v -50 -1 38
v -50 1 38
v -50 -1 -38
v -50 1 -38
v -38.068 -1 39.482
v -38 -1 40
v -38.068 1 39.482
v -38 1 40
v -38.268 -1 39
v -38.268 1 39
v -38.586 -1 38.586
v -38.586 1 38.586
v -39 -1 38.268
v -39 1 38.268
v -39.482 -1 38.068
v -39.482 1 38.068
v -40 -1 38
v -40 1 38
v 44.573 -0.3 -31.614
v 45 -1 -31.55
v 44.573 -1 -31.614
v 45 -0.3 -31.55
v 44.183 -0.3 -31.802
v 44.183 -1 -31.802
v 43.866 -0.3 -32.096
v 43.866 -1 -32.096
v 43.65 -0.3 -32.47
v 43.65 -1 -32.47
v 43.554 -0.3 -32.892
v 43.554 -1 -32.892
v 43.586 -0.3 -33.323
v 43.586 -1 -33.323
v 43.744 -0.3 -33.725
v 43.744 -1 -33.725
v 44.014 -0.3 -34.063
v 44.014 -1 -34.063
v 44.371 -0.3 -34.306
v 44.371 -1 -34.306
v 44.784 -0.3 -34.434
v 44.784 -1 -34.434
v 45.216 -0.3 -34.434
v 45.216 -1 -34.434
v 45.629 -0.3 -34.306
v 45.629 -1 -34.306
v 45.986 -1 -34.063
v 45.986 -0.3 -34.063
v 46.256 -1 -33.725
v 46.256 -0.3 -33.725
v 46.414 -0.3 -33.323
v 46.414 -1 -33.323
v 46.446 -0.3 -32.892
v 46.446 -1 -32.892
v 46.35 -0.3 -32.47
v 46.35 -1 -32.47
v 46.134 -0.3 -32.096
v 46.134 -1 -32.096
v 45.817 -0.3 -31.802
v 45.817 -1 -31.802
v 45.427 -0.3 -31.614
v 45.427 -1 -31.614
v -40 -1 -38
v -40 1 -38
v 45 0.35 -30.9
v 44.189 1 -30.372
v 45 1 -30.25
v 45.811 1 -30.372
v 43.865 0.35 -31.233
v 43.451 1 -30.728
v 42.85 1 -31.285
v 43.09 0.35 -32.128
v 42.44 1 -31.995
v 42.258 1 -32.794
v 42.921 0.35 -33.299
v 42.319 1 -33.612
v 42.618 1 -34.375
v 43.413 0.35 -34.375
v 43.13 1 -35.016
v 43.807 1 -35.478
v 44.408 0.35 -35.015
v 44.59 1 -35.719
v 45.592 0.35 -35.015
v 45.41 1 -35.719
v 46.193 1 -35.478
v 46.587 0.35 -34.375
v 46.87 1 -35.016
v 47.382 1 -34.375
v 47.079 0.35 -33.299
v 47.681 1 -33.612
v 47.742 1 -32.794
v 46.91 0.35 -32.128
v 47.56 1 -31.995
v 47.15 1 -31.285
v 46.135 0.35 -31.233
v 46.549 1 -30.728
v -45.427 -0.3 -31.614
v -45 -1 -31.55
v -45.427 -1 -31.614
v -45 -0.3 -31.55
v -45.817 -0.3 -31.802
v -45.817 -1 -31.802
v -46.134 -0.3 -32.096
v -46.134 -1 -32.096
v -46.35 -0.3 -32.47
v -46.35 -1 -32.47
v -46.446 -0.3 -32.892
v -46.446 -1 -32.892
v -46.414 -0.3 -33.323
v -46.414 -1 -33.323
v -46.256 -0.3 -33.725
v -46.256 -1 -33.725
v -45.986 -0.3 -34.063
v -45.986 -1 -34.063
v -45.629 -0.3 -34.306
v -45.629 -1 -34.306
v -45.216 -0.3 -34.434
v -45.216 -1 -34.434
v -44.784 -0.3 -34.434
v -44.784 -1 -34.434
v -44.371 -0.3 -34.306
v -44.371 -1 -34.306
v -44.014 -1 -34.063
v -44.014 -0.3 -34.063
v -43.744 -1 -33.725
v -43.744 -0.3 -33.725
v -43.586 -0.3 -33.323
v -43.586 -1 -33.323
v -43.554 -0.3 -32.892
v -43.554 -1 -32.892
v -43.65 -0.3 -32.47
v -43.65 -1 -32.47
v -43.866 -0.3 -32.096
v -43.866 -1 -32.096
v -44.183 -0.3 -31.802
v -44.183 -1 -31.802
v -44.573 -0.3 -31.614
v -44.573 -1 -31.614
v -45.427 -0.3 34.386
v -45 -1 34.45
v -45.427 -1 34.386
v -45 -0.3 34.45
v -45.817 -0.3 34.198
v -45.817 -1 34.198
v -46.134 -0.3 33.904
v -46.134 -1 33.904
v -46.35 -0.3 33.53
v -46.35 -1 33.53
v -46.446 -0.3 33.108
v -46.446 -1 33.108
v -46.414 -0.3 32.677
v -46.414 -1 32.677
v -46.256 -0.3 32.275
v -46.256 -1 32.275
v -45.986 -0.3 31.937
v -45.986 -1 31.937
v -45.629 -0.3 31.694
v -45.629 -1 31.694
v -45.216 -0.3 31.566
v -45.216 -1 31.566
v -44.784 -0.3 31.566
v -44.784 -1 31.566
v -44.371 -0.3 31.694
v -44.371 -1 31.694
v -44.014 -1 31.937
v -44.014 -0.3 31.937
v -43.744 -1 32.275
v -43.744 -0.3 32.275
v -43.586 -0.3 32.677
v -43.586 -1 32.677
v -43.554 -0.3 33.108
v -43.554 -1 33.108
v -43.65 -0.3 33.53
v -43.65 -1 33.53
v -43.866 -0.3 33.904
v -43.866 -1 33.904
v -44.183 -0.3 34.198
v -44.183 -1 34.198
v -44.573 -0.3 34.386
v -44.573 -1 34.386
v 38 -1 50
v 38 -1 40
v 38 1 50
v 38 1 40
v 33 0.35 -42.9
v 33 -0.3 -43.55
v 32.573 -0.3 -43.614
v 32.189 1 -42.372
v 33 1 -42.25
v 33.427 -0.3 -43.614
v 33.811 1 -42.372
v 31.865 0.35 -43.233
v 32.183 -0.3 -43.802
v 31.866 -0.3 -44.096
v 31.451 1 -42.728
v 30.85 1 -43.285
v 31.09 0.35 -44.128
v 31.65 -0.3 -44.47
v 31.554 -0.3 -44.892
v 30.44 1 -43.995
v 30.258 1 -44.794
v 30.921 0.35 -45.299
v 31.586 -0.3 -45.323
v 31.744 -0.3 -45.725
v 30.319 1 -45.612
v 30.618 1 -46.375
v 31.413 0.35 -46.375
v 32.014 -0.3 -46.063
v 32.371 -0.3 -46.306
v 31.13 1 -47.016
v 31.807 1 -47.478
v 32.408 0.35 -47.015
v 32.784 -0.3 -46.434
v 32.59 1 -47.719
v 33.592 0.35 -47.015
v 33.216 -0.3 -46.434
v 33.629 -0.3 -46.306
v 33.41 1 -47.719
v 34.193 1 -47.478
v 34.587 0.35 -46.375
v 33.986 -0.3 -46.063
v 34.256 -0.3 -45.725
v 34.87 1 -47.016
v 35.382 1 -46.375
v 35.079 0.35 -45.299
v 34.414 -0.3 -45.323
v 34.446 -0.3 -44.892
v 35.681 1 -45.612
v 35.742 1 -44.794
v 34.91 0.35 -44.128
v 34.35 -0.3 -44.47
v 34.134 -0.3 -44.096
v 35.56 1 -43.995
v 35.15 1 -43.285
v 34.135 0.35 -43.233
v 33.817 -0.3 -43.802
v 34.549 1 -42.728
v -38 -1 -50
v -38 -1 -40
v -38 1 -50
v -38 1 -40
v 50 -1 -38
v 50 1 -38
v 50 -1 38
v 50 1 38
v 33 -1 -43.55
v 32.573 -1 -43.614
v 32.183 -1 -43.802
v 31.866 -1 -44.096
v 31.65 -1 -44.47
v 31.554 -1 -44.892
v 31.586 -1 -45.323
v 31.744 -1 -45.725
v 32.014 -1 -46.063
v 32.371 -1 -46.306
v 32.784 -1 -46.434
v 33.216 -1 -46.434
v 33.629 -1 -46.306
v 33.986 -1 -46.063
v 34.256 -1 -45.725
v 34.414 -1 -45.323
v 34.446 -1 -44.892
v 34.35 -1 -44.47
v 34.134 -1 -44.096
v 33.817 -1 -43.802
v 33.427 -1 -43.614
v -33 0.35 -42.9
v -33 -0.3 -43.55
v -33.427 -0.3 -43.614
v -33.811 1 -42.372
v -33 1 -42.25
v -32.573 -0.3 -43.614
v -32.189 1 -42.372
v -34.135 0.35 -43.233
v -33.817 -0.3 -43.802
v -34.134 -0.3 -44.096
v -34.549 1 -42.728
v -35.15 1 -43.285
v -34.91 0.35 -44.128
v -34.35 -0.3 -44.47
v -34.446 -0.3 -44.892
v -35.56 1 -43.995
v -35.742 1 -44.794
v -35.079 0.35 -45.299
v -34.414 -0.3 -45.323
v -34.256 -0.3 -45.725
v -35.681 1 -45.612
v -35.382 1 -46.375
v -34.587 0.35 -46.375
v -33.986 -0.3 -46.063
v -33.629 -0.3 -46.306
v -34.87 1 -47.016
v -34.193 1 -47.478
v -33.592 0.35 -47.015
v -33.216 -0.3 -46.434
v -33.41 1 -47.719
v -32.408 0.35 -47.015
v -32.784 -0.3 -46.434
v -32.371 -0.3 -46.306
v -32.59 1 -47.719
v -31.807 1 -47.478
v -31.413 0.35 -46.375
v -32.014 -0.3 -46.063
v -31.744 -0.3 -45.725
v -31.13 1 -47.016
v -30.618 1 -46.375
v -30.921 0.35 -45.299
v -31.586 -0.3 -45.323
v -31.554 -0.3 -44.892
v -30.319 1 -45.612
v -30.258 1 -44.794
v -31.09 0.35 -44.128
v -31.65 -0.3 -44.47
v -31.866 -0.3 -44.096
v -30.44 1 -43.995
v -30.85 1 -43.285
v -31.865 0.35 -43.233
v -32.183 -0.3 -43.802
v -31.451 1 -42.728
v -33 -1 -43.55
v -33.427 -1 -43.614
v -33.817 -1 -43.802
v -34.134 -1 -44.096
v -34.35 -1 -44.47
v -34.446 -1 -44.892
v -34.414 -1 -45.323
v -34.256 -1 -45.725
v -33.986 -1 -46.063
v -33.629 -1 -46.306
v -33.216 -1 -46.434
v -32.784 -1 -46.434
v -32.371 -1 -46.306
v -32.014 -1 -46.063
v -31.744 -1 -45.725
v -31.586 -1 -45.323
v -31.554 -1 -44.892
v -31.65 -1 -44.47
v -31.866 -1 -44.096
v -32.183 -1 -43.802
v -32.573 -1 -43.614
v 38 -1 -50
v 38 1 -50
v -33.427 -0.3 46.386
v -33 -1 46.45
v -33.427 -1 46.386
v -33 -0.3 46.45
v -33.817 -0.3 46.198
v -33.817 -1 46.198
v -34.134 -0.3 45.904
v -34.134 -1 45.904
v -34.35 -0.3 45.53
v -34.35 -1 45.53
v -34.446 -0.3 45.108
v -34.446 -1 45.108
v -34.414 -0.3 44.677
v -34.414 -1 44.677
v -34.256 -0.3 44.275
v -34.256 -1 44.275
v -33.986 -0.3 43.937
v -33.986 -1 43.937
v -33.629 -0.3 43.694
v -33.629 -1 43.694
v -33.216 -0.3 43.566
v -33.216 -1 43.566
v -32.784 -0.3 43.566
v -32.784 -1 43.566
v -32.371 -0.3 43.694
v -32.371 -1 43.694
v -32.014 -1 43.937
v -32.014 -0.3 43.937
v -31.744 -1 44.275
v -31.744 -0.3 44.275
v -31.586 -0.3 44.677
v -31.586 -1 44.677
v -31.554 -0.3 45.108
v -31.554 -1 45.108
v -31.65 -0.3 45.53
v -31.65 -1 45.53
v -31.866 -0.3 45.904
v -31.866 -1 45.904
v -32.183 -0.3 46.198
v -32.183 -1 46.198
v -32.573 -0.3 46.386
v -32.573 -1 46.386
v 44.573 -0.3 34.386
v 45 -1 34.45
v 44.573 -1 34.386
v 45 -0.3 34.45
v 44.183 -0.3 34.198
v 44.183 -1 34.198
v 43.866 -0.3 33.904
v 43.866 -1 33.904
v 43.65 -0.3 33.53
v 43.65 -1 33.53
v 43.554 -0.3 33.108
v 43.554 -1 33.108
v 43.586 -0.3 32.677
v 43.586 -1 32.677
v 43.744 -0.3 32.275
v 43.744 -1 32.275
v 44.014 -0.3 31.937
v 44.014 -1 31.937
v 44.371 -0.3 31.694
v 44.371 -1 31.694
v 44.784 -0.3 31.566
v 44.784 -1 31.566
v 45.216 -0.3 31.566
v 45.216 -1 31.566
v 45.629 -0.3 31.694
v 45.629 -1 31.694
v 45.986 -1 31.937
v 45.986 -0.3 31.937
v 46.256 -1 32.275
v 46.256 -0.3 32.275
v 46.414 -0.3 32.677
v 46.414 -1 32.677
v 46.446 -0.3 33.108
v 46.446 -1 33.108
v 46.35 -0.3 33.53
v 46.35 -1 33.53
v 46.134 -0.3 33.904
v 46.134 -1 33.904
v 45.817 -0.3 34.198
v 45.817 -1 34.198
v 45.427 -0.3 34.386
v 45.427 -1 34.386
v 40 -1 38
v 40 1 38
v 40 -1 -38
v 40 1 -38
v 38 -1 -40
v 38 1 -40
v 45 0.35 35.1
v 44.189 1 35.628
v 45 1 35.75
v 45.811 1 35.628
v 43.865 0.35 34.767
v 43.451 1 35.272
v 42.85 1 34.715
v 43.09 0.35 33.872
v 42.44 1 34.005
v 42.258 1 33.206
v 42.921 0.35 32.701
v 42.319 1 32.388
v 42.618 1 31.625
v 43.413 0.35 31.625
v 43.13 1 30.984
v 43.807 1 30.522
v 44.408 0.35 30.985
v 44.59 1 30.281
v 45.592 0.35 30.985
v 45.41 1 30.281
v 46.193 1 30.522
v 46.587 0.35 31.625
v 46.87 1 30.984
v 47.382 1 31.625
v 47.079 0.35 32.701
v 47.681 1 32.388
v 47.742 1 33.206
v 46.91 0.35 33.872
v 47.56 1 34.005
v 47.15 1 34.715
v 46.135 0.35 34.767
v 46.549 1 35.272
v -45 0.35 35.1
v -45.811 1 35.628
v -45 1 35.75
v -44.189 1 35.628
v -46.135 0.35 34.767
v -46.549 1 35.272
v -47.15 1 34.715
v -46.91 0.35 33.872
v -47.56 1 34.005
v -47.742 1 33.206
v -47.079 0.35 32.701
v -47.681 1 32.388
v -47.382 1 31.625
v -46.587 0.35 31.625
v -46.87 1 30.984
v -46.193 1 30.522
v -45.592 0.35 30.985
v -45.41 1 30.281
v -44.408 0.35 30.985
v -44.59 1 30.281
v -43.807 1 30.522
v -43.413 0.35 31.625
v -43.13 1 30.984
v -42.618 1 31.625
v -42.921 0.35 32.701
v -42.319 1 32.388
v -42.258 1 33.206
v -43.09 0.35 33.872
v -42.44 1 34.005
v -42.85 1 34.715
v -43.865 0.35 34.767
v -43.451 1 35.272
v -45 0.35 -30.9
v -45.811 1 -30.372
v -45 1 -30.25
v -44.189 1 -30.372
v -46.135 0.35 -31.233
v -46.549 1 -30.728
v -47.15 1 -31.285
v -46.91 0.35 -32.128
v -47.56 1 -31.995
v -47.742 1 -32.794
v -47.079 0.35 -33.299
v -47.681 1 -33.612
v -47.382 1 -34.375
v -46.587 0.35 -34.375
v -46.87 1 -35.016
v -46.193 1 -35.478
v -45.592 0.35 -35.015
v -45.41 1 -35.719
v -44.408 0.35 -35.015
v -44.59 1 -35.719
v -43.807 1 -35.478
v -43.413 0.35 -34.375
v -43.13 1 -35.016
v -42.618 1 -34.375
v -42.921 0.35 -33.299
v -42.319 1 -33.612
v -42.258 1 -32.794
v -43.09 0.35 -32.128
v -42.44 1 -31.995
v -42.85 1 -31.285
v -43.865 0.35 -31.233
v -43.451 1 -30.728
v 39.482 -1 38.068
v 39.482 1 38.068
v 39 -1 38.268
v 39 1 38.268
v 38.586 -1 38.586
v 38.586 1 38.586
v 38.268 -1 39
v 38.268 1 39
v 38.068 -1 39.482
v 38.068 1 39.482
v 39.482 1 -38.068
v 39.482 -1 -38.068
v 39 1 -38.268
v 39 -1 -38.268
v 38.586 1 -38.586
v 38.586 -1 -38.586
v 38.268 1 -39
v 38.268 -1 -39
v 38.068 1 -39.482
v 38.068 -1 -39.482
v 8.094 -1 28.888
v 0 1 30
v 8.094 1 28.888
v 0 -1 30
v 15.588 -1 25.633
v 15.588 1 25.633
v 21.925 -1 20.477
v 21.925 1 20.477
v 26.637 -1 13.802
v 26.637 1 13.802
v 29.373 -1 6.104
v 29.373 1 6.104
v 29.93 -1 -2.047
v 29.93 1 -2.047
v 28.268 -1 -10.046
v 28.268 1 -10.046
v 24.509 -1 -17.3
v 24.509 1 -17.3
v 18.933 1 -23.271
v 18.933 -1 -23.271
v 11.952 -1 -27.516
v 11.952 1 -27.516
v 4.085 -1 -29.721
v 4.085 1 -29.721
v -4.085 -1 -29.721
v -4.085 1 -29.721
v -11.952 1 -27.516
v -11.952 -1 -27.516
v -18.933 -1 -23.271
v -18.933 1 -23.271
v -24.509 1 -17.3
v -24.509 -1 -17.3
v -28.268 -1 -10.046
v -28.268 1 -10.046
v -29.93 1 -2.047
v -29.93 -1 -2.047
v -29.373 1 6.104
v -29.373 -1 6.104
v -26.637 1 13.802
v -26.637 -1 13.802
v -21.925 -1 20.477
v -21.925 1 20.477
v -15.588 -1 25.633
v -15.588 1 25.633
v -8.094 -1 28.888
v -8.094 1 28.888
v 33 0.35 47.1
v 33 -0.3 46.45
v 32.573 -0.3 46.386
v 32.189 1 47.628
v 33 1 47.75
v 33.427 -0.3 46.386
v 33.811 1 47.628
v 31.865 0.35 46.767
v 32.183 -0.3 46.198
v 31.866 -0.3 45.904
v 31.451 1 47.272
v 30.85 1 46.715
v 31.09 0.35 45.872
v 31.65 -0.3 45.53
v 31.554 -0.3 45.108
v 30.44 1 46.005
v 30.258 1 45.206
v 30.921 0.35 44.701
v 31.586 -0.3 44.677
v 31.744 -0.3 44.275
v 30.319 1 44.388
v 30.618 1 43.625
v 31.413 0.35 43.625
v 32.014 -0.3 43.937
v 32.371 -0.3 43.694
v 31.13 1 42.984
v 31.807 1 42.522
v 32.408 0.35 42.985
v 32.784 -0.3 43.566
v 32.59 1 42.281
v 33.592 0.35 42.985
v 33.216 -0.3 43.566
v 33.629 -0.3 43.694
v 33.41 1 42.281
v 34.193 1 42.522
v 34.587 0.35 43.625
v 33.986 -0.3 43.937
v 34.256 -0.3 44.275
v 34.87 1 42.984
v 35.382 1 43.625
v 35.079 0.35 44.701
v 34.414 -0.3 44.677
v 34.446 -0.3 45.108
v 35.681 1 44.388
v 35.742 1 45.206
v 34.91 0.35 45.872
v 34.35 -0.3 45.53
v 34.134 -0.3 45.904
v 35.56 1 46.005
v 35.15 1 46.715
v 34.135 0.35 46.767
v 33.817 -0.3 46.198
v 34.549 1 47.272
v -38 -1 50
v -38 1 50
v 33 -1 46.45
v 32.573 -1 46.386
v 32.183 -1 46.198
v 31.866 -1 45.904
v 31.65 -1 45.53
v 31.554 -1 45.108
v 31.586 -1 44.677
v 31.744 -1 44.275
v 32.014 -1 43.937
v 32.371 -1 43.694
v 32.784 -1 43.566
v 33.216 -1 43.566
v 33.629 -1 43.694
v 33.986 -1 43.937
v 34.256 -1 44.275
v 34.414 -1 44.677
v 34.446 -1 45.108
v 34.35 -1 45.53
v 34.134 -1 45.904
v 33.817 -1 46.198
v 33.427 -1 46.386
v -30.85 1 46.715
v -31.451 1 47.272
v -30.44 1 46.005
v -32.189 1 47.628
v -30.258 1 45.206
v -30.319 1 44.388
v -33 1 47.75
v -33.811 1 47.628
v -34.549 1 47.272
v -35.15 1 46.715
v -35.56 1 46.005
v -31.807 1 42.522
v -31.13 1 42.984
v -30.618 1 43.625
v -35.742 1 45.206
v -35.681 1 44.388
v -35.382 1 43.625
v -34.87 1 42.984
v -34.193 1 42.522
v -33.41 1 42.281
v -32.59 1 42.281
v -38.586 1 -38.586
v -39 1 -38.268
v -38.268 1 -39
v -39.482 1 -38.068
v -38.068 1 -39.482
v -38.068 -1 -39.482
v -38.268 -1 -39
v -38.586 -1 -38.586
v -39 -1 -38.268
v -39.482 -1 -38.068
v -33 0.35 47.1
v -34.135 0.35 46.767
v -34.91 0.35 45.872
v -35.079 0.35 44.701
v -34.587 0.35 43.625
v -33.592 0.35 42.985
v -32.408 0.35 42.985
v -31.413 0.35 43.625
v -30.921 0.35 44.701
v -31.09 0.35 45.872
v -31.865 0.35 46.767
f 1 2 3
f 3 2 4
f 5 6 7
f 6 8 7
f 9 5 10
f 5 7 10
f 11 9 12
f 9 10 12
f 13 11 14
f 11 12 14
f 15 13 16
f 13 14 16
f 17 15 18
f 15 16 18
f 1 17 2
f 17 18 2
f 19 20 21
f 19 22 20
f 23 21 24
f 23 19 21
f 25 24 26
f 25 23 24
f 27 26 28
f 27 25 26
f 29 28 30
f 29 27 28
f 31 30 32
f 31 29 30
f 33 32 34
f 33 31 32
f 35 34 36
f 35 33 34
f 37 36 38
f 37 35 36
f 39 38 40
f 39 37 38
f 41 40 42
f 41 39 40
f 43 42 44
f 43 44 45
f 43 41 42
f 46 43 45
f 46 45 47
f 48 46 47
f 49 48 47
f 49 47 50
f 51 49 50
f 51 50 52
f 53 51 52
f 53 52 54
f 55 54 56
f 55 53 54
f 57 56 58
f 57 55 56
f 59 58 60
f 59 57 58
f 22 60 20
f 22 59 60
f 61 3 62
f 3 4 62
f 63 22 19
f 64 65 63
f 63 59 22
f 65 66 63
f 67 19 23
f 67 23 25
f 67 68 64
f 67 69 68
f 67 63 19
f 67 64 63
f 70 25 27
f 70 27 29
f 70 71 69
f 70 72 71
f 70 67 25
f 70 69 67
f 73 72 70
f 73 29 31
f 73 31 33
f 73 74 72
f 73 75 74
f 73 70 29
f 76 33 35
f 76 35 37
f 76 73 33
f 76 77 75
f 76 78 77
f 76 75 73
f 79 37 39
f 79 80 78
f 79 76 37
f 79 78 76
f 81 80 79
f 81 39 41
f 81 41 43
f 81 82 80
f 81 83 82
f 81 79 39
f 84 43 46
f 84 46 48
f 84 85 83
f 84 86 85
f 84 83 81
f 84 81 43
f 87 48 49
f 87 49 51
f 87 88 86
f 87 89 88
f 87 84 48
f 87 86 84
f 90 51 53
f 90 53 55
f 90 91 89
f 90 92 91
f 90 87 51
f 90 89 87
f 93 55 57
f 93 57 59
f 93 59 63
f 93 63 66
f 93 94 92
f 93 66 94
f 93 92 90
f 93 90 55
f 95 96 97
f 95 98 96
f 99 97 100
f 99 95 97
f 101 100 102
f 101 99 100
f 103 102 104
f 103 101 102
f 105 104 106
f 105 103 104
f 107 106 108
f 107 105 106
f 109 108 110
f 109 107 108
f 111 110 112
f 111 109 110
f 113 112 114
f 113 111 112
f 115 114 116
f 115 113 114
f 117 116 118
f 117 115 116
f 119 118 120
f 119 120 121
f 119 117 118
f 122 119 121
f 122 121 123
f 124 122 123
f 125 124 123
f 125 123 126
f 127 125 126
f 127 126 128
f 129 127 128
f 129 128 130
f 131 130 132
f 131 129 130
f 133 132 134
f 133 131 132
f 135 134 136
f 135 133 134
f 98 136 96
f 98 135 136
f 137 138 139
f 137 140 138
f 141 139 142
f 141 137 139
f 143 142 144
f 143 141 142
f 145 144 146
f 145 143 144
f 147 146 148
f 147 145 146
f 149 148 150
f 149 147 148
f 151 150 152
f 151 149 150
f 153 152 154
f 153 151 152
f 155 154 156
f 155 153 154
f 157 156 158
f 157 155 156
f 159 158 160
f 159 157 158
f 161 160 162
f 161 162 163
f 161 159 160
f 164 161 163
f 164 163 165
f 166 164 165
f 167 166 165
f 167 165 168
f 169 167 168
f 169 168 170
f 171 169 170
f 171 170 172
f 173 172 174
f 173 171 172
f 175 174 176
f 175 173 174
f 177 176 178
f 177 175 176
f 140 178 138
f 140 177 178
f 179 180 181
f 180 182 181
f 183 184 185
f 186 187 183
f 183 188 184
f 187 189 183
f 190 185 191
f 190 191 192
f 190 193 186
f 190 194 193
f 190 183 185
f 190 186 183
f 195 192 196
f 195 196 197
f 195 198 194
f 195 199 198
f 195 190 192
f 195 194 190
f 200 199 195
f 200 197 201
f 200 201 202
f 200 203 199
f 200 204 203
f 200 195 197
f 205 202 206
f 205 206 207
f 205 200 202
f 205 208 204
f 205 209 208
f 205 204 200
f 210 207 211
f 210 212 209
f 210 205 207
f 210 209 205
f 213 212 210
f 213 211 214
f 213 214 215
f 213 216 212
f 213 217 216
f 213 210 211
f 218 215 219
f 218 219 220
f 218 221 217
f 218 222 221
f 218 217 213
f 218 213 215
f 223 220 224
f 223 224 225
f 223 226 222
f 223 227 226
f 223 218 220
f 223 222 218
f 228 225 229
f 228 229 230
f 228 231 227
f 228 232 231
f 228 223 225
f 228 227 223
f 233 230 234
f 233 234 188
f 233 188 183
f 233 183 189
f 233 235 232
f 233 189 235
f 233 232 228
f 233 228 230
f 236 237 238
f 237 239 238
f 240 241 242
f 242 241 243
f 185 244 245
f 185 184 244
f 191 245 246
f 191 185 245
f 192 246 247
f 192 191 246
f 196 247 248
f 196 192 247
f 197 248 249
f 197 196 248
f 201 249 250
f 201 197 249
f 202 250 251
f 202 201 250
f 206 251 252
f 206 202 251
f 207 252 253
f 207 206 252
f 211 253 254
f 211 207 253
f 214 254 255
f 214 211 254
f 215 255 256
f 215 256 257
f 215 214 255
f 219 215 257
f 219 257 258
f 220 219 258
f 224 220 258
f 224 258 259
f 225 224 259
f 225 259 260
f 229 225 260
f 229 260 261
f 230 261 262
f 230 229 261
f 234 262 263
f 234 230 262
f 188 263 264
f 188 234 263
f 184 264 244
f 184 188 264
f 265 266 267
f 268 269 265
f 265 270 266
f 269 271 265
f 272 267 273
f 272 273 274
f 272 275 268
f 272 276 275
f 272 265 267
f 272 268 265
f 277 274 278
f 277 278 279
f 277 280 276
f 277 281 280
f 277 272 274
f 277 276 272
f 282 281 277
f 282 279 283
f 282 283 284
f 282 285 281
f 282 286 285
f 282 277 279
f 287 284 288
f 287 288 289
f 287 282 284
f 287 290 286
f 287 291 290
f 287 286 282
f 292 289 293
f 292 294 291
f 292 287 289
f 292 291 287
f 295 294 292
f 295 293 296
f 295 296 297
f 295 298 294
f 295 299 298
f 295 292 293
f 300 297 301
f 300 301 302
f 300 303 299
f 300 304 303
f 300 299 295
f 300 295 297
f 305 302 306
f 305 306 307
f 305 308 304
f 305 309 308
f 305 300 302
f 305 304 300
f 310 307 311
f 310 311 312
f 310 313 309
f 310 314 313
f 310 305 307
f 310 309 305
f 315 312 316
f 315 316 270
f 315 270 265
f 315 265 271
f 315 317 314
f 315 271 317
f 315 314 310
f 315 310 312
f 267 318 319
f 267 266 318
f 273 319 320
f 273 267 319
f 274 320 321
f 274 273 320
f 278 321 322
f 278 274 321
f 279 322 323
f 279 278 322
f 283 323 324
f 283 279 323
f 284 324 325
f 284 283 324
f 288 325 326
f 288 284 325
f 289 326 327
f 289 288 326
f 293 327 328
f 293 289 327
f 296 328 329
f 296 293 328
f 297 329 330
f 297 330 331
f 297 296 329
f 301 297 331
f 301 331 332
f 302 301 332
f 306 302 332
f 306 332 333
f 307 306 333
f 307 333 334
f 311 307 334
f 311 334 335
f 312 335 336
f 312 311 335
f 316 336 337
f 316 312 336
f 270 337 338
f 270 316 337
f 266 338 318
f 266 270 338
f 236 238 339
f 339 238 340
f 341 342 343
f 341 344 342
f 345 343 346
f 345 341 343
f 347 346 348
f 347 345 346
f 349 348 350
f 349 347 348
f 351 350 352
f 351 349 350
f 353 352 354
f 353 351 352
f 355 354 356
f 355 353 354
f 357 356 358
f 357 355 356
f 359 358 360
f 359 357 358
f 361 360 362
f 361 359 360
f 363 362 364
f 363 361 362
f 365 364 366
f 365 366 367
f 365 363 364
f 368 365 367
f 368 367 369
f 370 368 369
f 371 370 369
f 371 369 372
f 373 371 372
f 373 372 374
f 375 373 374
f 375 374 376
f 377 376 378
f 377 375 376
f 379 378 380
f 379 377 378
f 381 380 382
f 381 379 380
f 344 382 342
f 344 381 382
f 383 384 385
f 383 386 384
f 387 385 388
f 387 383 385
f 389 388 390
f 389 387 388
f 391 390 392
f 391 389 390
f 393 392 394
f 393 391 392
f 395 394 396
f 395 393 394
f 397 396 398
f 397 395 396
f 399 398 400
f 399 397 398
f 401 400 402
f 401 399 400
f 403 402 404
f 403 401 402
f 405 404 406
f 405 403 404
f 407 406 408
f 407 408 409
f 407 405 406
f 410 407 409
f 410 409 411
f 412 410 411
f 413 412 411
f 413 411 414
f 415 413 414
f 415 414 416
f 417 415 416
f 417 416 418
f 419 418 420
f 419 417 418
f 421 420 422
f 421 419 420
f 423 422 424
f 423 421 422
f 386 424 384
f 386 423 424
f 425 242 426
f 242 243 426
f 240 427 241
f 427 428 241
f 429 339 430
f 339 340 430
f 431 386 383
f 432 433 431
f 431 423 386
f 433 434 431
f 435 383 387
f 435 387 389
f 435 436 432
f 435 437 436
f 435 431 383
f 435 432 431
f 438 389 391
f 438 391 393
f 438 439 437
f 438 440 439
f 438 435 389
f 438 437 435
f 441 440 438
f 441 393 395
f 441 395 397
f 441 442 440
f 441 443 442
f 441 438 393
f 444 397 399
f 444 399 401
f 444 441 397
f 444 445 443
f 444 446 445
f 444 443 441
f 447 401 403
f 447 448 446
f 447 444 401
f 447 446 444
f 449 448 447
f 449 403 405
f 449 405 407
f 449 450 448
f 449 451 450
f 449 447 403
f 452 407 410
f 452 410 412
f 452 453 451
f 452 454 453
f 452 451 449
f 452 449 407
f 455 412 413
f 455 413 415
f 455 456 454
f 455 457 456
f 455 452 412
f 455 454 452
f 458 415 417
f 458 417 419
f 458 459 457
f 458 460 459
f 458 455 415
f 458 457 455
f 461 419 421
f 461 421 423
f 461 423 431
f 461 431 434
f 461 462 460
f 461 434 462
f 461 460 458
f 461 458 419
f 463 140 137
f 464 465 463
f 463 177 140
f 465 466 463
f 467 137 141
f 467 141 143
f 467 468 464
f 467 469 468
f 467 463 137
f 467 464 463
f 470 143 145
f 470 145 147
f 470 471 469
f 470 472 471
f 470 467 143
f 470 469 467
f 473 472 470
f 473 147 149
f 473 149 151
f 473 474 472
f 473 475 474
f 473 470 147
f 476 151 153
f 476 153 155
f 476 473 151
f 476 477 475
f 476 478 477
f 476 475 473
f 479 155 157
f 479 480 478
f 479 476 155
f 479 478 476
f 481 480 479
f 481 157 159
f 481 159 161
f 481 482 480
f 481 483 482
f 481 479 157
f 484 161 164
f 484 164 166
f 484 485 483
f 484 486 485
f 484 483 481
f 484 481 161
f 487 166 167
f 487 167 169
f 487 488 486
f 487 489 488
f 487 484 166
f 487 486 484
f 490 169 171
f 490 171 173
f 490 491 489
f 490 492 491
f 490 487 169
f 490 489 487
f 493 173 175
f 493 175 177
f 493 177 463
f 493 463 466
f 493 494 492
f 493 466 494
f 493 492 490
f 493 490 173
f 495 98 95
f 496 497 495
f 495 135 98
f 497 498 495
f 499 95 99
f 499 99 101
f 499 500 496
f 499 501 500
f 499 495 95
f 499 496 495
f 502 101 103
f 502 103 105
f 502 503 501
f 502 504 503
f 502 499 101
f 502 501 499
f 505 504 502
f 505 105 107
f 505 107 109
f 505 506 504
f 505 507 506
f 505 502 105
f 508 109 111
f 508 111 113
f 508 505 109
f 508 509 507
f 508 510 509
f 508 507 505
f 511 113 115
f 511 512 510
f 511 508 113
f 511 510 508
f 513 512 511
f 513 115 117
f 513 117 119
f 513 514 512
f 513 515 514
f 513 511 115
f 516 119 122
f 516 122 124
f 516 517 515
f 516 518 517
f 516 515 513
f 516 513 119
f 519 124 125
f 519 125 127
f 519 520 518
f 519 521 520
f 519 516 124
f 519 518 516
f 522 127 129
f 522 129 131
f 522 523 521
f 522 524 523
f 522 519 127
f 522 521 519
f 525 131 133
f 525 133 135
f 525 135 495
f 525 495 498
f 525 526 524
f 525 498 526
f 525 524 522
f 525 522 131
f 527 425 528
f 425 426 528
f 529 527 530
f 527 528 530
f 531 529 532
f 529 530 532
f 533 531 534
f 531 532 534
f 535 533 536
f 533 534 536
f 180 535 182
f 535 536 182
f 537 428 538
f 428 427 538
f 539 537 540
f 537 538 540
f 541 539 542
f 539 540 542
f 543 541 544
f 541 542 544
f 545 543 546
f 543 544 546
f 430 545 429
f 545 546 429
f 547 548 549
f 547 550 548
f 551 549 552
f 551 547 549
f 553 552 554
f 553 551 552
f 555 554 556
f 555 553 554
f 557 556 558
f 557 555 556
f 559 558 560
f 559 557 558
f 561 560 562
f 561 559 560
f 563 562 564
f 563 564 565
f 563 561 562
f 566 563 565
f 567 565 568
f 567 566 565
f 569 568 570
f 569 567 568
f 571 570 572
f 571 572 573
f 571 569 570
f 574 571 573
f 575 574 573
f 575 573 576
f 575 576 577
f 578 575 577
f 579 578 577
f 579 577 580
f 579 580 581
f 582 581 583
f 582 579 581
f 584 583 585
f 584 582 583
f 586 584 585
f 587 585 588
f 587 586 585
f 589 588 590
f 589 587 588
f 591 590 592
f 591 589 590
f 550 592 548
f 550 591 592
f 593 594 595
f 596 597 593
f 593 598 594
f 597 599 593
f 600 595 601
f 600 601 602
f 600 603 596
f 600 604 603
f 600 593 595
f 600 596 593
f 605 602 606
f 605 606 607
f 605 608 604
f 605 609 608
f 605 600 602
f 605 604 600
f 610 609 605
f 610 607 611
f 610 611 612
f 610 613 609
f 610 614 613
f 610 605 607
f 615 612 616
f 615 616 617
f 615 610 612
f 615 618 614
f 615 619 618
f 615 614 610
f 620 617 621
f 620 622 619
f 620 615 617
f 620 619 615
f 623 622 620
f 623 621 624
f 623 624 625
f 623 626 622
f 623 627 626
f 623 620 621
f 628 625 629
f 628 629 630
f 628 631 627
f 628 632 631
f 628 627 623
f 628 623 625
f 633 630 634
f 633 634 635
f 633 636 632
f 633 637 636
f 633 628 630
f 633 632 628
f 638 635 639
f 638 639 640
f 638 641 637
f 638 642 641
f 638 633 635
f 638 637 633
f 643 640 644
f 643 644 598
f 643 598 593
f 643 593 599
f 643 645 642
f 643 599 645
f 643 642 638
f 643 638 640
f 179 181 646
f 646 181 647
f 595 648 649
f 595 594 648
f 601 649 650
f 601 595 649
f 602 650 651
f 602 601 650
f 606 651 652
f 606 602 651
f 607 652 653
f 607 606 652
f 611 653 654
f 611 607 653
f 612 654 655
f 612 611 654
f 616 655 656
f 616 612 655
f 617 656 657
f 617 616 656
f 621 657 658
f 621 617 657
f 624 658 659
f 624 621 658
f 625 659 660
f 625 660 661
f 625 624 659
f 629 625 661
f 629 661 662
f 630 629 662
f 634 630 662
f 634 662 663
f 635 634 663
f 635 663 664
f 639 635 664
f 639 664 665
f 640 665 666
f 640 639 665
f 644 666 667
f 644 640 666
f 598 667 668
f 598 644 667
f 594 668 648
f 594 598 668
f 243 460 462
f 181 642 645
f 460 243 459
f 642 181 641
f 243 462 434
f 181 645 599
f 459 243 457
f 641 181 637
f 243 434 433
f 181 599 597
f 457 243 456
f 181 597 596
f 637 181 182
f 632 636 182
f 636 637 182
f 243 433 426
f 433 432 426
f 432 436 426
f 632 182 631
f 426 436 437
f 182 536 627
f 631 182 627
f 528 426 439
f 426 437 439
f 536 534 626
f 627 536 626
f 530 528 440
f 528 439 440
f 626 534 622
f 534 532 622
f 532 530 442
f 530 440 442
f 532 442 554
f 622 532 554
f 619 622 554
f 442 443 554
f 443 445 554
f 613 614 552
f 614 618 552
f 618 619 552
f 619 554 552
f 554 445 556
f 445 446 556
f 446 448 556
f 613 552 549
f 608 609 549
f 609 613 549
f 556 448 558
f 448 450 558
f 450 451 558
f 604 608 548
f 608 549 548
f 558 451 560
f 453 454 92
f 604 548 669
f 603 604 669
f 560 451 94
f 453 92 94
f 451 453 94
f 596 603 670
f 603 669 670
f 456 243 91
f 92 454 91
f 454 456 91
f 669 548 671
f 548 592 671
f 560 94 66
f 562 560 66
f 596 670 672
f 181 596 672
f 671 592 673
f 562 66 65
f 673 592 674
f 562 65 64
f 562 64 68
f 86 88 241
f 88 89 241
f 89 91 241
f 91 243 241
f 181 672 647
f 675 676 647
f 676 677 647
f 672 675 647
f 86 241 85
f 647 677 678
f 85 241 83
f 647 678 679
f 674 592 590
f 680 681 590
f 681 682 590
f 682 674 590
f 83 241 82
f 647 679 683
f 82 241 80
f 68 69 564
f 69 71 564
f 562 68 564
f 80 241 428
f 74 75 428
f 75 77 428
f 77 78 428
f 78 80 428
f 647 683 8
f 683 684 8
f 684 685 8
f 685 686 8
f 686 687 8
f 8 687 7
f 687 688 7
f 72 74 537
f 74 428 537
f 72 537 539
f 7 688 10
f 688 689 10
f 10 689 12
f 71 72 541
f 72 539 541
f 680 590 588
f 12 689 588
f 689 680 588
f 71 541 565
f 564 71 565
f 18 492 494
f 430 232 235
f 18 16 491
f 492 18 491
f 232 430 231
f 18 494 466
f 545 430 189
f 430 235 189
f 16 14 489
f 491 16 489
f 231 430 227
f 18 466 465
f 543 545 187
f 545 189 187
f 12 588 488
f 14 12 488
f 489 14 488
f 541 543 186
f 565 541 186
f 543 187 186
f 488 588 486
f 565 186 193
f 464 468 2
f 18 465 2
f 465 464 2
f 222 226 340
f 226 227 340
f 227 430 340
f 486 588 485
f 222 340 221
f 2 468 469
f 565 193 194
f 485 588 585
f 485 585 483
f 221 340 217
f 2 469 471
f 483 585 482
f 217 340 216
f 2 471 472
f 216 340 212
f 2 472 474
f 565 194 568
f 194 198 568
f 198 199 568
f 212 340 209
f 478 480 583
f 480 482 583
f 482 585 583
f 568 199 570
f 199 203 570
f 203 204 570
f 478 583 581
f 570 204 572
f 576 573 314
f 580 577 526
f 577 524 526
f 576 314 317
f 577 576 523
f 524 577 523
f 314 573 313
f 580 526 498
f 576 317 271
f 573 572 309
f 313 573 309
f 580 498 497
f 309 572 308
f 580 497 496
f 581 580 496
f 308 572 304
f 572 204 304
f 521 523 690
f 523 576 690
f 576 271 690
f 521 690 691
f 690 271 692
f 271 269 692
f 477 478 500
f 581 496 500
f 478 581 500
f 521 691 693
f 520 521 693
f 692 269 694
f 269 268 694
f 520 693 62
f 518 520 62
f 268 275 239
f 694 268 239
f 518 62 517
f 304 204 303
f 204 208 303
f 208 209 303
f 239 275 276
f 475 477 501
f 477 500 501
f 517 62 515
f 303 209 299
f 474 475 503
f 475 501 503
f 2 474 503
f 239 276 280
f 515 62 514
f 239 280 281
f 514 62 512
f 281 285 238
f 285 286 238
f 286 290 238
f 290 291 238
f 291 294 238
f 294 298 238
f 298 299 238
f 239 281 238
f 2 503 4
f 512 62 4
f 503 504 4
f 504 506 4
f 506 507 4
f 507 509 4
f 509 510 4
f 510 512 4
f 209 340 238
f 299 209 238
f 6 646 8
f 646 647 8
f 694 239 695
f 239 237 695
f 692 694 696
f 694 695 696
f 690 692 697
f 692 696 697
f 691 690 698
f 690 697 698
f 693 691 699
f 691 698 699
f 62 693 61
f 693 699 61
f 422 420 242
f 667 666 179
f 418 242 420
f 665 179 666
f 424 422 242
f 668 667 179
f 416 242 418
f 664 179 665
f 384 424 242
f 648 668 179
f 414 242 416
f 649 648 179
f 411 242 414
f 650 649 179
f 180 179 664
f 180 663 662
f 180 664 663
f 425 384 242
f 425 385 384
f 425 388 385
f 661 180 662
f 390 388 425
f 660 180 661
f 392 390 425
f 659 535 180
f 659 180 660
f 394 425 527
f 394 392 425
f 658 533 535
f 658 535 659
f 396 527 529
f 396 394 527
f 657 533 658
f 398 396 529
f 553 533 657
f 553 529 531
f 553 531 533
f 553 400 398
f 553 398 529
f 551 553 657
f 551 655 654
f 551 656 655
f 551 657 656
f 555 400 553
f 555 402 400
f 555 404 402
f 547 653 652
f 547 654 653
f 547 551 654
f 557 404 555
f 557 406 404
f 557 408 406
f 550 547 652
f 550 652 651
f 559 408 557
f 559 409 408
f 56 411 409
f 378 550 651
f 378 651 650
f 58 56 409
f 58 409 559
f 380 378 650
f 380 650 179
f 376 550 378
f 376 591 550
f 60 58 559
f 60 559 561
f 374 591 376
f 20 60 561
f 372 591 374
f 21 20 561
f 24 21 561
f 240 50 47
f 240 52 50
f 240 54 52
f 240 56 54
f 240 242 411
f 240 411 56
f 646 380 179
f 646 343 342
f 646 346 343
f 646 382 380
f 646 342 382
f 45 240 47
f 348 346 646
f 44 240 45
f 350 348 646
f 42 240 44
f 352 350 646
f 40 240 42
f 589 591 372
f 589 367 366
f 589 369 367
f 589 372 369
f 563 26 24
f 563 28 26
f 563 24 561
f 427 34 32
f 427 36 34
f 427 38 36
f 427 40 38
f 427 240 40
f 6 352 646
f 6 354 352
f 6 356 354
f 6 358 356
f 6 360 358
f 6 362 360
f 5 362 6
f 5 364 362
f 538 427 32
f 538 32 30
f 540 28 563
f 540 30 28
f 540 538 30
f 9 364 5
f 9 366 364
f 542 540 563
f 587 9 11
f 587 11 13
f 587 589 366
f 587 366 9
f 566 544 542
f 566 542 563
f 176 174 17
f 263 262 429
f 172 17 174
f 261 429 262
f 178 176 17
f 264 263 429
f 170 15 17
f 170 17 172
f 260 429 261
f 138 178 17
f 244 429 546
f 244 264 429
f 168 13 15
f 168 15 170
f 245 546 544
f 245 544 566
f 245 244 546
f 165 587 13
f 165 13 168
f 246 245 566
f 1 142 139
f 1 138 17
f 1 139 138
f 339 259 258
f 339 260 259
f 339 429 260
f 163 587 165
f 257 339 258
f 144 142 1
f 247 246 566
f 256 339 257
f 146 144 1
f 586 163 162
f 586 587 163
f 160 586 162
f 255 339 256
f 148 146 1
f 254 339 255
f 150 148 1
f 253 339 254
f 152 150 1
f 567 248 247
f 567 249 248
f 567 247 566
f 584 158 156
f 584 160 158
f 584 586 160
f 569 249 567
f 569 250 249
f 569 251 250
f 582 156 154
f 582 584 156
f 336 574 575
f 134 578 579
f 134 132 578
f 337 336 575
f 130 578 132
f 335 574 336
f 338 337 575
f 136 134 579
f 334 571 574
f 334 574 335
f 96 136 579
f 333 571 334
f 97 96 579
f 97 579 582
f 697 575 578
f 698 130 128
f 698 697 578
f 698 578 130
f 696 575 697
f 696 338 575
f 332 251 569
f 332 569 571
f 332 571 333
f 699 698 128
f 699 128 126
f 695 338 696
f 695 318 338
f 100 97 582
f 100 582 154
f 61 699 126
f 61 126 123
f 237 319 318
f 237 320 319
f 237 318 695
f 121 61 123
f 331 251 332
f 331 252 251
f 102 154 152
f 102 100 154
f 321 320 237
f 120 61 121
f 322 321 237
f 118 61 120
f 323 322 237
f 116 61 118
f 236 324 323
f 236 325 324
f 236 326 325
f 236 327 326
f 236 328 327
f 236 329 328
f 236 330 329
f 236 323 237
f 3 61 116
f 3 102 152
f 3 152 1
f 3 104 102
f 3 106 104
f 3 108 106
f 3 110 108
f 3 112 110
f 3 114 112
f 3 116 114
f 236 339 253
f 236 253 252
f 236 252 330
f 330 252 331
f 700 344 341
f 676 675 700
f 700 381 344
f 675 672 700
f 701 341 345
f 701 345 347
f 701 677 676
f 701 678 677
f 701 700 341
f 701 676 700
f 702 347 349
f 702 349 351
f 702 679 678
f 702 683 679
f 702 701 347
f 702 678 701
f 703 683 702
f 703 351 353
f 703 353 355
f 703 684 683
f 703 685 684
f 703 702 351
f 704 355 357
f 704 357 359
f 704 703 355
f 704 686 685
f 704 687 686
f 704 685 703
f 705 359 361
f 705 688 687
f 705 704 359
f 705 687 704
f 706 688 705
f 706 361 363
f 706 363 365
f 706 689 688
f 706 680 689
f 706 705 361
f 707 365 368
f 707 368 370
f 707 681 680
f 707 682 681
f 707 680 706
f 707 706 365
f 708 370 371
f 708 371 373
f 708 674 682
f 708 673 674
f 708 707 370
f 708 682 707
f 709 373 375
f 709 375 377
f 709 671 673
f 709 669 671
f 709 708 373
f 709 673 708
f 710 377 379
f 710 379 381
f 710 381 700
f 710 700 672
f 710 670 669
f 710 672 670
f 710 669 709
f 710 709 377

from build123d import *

# Parameters (mm, degrees)
SCHIZZO1_R                              = 30
ESTRUSIONE_ESTRUSIONE1_DEPTH            = 1
RACCORDO1_R                             = 2
FORO_SVASATO_PER_VITE_M2_5_1_AT_2_COUNT = 2
FORO_SVASATO_PER_VITE_M2_5_1_AT_2_PITCH = 16.970562748
FORO_SVASATO_PER_VITE_M2_5_1_AT_3_COUNT = 2
FORO_SVASATO_PER_VITE_M2_5_1_AT_3_PITCH = 78.917678628
FORO_SVASATO_PER_VITE_M2_5_1_AT_4_COUNT = 2
FORO_SVASATO_PER_VITE_M2_5_1_AT_4_PITCH = 90
FORO_SVASATO_PER_VITE_M2_5_1_AT_5_COUNT = 2
FORO_SVASATO_PER_VITE_M2_5_1_AT_5_PITCH = 111.606451426
FORO_SVASATO_PER_VITE_M2_5_1_AT_6_COUNT = 2
FORO_SVASATO_PER_VITE_M2_5_1_AT_6_PITCH = 110.308657865
FORO_SVASATO_PER_VITE_M2_5_1_AT_7_COUNT = 2
FORO_SVASATO_PER_VITE_M2_5_1_AT_7_PITCH = 78.917678628
FORO_SVASATO_PER_VITE_M2_5_1_AT_8_COUNT = 2
FORO_SVASATO_PER_VITE_M2_5_1_AT_8_PITCH = 66


with BuildPart() as part:
    # Schizzo1 → Estrusione-Estrusione1 (new, symmetric)
    with BuildSketch(Plane(origin=(0, 0, 0), x_dir=(1, 0, 0), z_dir=(0, 1, 0))):
        Polygon((-50, -38), (-50, 38), (-38, 38), (-38, 50), (38, 50), (38, 38), (50, 38), (50, -38), (38, -38), (38, -50), (-38, -50), (-38, -38), align=None)
        with Locations(Location((0, 0, 0), (0, 0, 270))):
            Circle(SCHIZZO1_R, mode=Mode.SUBTRACT)
    extrude(amount=ESTRUSIONE_ESTRUSIONE1_DEPTH, both=True)

    # Raccordo1
    raccordo1_edges = [part.edges().sort_by_distance(p)[0] for p in [
        (-38, 0, -38),
        (38, 0, -38),
        (38, 0, 38),
        (-38, 0, 38),
    ]]
    fillet(raccordo1_edges, radius=RACCORDO1_R)

    # Schizzo4 → Foro svasato per Vite M2.5-1 (revolve, cut)
    with BuildSketch(Plane(origin=(-33, 1, -45), x_dir=(0, 0, 1), z_dir=(1, 0, 0))):
        Polygon((0, 0), (0, 2), (1.45, 2), (1.45, 1.3), (2.75, 0), align=None)
    foro_svasato_per_vite_m2_5_1 = revolve(axis=Axis((-33, 7.35, -45), (0, -1, 0)), mode=Mode.SUBTRACT)

    # Foro svasato per Vite M2.5-1 at 2: Foro svasato per Vite M2.5-1 ×2
    with Locations(*[Vector(-0.7071067811865476, 0, 0.7071067811865476) * (i * FORO_SVASATO_PER_VITE_M2_5_1_AT_2_PITCH) for i in range(1, FORO_SVASATO_PER_VITE_M2_5_1_AT_2_COUNT)]):
        add(foro_svasato_per_vite_m2_5_1, mode=Mode.SUBTRACT)

    # Foro svasato per Vite M2.5-1 at 3: Foro svasato per Vite M2.5-1 ×2
    with Locations(*[Vector(-0.15205718425394116, 0, 0.9883716976506172) * (i * FORO_SVASATO_PER_VITE_M2_5_1_AT_3_PITCH) for i in range(1, FORO_SVASATO_PER_VITE_M2_5_1_AT_3_COUNT)]):
        add(foro_svasato_per_vite_m2_5_1, mode=Mode.SUBTRACT)

    # Foro svasato per Vite M2.5-1 at 4: Foro svasato per Vite M2.5-1 ×2
    with Locations(*[(0, 0, i * FORO_SVASATO_PER_VITE_M2_5_1_AT_4_PITCH) for i in range(1, FORO_SVASATO_PER_VITE_M2_5_1_AT_4_COUNT)]):
        add(foro_svasato_per_vite_m2_5_1, mode=Mode.SUBTRACT)

    # Foro svasato per Vite M2.5-1 at 5: Foro svasato per Vite M2.5-1 ×2
    with Locations(*[Vector(0.5913636636275174, 0, 0.8064049958557056) * (i * FORO_SVASATO_PER_VITE_M2_5_1_AT_5_PITCH) for i in range(1, FORO_SVASATO_PER_VITE_M2_5_1_AT_5_COUNT)]):
        add(foro_svasato_per_vite_m2_5_1, mode=Mode.SUBTRACT)

    # Foro svasato per Vite M2.5-1 at 6: Foro svasato per Vite M2.5-1 ×2
    with Locations(*[Vector(0.7071067811865476, 0, 0.7071067811865476) * (i * FORO_SVASATO_PER_VITE_M2_5_1_AT_6_PITCH) for i in range(1, FORO_SVASATO_PER_VITE_M2_5_1_AT_6_COUNT)]):
        add(foro_svasato_per_vite_m2_5_1, mode=Mode.SUBTRACT)

    # Foro svasato per Vite M2.5-1 at 7: Foro svasato per Vite M2.5-1 ×2
    with Locations(*[Vector(0.9883716976506172, 0, 0.1520571842539412) * (i * FORO_SVASATO_PER_VITE_M2_5_1_AT_7_PITCH) for i in range(1, FORO_SVASATO_PER_VITE_M2_5_1_AT_7_COUNT)]):
        add(foro_svasato_per_vite_m2_5_1, mode=Mode.SUBTRACT)

    # Foro svasato per Vite M2.5-1 at 8: Foro svasato per Vite M2.5-1 ×2
    with Locations(*[(i * FORO_SVASATO_PER_VITE_M2_5_1_AT_8_PITCH, 0, 0) for i in range(1, FORO_SVASATO_PER_VITE_M2_5_1_AT_8_COUNT)]):
        add(foro_svasato_per_vite_m2_5_1, mode=Mode.SUBTRACT)


solid = part.part
